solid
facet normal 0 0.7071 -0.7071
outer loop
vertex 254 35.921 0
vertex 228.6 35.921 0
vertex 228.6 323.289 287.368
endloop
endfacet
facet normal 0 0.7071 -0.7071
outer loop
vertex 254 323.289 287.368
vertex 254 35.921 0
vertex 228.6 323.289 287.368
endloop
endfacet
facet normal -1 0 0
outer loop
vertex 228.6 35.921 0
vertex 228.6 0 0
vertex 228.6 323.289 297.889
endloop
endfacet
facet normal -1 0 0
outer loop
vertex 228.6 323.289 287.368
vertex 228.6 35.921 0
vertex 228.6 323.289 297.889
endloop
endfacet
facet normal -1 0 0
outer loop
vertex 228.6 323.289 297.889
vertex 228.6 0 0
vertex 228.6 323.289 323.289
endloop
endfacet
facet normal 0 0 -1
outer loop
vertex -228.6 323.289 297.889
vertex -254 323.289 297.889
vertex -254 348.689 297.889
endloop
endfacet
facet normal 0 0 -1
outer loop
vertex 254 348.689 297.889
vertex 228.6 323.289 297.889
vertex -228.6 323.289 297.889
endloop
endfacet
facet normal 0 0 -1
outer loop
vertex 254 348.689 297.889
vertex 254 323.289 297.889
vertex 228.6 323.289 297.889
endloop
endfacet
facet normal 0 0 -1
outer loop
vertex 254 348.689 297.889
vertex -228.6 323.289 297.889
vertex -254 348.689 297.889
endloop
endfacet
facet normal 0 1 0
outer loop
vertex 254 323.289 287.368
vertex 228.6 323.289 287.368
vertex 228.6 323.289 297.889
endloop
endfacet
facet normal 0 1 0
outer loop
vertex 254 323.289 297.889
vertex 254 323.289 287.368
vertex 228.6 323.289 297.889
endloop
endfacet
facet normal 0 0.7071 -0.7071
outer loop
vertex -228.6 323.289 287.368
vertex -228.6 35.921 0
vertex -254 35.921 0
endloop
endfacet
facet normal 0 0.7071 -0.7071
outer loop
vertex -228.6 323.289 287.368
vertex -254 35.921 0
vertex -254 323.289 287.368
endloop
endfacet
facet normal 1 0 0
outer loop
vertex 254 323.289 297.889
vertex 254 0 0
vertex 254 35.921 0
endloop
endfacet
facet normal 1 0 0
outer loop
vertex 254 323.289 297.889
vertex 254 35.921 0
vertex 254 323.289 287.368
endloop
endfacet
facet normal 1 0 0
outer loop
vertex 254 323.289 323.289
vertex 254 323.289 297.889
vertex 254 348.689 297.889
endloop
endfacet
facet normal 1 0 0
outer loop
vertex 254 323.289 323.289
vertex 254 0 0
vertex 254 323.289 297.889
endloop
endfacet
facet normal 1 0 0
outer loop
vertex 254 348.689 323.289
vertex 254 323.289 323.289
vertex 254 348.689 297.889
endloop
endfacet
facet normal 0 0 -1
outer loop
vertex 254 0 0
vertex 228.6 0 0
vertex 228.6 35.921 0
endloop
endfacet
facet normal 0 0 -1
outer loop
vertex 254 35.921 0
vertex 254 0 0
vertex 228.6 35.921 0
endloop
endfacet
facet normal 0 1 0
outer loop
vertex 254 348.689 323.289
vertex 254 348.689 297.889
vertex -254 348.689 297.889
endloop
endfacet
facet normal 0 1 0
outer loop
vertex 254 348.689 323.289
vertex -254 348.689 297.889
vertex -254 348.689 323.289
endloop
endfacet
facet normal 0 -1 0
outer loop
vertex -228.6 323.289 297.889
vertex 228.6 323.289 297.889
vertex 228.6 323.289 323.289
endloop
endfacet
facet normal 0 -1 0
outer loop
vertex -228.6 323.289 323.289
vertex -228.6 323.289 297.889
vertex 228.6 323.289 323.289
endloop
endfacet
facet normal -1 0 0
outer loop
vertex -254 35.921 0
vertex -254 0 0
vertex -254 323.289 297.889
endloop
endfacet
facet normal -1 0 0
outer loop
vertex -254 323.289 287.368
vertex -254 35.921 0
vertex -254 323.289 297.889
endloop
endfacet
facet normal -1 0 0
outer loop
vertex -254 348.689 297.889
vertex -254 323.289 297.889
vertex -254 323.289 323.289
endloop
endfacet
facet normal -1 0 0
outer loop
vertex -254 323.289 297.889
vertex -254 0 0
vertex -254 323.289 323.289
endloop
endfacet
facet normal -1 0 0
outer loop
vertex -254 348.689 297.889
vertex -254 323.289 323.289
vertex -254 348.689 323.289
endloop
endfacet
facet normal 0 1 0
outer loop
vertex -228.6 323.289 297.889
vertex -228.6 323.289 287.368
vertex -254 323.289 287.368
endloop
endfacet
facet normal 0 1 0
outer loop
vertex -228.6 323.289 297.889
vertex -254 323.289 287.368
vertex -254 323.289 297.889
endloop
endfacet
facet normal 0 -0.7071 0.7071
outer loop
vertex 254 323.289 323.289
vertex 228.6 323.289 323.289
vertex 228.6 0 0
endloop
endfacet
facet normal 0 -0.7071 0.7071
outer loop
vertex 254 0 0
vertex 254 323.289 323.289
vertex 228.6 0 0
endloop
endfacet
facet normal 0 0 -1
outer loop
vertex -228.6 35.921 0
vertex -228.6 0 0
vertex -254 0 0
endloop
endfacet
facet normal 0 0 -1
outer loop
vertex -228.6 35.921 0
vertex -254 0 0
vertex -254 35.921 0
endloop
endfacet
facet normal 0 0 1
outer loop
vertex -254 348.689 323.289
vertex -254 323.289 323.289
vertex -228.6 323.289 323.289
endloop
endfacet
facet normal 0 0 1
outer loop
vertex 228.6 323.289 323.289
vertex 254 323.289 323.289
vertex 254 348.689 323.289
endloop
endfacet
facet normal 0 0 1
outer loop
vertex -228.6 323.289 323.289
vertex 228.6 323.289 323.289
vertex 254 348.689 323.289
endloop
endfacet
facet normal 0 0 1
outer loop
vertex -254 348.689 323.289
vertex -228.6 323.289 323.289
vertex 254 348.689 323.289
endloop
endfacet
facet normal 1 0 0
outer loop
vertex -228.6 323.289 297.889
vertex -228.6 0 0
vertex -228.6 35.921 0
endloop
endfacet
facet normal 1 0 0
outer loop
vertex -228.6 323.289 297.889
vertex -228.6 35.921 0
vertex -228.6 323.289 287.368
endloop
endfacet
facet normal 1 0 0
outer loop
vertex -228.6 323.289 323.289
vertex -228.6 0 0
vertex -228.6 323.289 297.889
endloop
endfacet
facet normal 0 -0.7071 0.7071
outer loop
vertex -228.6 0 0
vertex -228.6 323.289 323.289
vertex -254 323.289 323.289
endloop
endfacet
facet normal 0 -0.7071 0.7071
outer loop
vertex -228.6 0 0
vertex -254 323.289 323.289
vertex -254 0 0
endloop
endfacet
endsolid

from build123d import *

# Parameters (mm, degrees)
F2_DEPTH = 25.4
F3_W     = 25.4
F3_H     = 25.4
F4_DEPTH = 254


with BuildPart() as f2:
    # F1 (on offset) → F2 (new body)
    with BuildSketch(Plane.YZ.offset(228.6)):
        Polygon((323.28922, 323.28922), (0, 0), (35.921024, 0), (323.28922, 287.368196), align=None)
    extrude(amount=F2_DEPTH)

    # F3 (on Right) → F4 (join, through all)
    with BuildSketch(Plane.YZ):
        with Locations((335.98922, 310.58922)):
            Rectangle(F3_W, F3_H)
    extrude(amount=F4_DEPTH)

    # F5: F2 across plane


with BuildPart() as f2_1:
    add(f2.part)
    add(f2.part.mirror(Plane.YZ))


solid = f2_1.part
